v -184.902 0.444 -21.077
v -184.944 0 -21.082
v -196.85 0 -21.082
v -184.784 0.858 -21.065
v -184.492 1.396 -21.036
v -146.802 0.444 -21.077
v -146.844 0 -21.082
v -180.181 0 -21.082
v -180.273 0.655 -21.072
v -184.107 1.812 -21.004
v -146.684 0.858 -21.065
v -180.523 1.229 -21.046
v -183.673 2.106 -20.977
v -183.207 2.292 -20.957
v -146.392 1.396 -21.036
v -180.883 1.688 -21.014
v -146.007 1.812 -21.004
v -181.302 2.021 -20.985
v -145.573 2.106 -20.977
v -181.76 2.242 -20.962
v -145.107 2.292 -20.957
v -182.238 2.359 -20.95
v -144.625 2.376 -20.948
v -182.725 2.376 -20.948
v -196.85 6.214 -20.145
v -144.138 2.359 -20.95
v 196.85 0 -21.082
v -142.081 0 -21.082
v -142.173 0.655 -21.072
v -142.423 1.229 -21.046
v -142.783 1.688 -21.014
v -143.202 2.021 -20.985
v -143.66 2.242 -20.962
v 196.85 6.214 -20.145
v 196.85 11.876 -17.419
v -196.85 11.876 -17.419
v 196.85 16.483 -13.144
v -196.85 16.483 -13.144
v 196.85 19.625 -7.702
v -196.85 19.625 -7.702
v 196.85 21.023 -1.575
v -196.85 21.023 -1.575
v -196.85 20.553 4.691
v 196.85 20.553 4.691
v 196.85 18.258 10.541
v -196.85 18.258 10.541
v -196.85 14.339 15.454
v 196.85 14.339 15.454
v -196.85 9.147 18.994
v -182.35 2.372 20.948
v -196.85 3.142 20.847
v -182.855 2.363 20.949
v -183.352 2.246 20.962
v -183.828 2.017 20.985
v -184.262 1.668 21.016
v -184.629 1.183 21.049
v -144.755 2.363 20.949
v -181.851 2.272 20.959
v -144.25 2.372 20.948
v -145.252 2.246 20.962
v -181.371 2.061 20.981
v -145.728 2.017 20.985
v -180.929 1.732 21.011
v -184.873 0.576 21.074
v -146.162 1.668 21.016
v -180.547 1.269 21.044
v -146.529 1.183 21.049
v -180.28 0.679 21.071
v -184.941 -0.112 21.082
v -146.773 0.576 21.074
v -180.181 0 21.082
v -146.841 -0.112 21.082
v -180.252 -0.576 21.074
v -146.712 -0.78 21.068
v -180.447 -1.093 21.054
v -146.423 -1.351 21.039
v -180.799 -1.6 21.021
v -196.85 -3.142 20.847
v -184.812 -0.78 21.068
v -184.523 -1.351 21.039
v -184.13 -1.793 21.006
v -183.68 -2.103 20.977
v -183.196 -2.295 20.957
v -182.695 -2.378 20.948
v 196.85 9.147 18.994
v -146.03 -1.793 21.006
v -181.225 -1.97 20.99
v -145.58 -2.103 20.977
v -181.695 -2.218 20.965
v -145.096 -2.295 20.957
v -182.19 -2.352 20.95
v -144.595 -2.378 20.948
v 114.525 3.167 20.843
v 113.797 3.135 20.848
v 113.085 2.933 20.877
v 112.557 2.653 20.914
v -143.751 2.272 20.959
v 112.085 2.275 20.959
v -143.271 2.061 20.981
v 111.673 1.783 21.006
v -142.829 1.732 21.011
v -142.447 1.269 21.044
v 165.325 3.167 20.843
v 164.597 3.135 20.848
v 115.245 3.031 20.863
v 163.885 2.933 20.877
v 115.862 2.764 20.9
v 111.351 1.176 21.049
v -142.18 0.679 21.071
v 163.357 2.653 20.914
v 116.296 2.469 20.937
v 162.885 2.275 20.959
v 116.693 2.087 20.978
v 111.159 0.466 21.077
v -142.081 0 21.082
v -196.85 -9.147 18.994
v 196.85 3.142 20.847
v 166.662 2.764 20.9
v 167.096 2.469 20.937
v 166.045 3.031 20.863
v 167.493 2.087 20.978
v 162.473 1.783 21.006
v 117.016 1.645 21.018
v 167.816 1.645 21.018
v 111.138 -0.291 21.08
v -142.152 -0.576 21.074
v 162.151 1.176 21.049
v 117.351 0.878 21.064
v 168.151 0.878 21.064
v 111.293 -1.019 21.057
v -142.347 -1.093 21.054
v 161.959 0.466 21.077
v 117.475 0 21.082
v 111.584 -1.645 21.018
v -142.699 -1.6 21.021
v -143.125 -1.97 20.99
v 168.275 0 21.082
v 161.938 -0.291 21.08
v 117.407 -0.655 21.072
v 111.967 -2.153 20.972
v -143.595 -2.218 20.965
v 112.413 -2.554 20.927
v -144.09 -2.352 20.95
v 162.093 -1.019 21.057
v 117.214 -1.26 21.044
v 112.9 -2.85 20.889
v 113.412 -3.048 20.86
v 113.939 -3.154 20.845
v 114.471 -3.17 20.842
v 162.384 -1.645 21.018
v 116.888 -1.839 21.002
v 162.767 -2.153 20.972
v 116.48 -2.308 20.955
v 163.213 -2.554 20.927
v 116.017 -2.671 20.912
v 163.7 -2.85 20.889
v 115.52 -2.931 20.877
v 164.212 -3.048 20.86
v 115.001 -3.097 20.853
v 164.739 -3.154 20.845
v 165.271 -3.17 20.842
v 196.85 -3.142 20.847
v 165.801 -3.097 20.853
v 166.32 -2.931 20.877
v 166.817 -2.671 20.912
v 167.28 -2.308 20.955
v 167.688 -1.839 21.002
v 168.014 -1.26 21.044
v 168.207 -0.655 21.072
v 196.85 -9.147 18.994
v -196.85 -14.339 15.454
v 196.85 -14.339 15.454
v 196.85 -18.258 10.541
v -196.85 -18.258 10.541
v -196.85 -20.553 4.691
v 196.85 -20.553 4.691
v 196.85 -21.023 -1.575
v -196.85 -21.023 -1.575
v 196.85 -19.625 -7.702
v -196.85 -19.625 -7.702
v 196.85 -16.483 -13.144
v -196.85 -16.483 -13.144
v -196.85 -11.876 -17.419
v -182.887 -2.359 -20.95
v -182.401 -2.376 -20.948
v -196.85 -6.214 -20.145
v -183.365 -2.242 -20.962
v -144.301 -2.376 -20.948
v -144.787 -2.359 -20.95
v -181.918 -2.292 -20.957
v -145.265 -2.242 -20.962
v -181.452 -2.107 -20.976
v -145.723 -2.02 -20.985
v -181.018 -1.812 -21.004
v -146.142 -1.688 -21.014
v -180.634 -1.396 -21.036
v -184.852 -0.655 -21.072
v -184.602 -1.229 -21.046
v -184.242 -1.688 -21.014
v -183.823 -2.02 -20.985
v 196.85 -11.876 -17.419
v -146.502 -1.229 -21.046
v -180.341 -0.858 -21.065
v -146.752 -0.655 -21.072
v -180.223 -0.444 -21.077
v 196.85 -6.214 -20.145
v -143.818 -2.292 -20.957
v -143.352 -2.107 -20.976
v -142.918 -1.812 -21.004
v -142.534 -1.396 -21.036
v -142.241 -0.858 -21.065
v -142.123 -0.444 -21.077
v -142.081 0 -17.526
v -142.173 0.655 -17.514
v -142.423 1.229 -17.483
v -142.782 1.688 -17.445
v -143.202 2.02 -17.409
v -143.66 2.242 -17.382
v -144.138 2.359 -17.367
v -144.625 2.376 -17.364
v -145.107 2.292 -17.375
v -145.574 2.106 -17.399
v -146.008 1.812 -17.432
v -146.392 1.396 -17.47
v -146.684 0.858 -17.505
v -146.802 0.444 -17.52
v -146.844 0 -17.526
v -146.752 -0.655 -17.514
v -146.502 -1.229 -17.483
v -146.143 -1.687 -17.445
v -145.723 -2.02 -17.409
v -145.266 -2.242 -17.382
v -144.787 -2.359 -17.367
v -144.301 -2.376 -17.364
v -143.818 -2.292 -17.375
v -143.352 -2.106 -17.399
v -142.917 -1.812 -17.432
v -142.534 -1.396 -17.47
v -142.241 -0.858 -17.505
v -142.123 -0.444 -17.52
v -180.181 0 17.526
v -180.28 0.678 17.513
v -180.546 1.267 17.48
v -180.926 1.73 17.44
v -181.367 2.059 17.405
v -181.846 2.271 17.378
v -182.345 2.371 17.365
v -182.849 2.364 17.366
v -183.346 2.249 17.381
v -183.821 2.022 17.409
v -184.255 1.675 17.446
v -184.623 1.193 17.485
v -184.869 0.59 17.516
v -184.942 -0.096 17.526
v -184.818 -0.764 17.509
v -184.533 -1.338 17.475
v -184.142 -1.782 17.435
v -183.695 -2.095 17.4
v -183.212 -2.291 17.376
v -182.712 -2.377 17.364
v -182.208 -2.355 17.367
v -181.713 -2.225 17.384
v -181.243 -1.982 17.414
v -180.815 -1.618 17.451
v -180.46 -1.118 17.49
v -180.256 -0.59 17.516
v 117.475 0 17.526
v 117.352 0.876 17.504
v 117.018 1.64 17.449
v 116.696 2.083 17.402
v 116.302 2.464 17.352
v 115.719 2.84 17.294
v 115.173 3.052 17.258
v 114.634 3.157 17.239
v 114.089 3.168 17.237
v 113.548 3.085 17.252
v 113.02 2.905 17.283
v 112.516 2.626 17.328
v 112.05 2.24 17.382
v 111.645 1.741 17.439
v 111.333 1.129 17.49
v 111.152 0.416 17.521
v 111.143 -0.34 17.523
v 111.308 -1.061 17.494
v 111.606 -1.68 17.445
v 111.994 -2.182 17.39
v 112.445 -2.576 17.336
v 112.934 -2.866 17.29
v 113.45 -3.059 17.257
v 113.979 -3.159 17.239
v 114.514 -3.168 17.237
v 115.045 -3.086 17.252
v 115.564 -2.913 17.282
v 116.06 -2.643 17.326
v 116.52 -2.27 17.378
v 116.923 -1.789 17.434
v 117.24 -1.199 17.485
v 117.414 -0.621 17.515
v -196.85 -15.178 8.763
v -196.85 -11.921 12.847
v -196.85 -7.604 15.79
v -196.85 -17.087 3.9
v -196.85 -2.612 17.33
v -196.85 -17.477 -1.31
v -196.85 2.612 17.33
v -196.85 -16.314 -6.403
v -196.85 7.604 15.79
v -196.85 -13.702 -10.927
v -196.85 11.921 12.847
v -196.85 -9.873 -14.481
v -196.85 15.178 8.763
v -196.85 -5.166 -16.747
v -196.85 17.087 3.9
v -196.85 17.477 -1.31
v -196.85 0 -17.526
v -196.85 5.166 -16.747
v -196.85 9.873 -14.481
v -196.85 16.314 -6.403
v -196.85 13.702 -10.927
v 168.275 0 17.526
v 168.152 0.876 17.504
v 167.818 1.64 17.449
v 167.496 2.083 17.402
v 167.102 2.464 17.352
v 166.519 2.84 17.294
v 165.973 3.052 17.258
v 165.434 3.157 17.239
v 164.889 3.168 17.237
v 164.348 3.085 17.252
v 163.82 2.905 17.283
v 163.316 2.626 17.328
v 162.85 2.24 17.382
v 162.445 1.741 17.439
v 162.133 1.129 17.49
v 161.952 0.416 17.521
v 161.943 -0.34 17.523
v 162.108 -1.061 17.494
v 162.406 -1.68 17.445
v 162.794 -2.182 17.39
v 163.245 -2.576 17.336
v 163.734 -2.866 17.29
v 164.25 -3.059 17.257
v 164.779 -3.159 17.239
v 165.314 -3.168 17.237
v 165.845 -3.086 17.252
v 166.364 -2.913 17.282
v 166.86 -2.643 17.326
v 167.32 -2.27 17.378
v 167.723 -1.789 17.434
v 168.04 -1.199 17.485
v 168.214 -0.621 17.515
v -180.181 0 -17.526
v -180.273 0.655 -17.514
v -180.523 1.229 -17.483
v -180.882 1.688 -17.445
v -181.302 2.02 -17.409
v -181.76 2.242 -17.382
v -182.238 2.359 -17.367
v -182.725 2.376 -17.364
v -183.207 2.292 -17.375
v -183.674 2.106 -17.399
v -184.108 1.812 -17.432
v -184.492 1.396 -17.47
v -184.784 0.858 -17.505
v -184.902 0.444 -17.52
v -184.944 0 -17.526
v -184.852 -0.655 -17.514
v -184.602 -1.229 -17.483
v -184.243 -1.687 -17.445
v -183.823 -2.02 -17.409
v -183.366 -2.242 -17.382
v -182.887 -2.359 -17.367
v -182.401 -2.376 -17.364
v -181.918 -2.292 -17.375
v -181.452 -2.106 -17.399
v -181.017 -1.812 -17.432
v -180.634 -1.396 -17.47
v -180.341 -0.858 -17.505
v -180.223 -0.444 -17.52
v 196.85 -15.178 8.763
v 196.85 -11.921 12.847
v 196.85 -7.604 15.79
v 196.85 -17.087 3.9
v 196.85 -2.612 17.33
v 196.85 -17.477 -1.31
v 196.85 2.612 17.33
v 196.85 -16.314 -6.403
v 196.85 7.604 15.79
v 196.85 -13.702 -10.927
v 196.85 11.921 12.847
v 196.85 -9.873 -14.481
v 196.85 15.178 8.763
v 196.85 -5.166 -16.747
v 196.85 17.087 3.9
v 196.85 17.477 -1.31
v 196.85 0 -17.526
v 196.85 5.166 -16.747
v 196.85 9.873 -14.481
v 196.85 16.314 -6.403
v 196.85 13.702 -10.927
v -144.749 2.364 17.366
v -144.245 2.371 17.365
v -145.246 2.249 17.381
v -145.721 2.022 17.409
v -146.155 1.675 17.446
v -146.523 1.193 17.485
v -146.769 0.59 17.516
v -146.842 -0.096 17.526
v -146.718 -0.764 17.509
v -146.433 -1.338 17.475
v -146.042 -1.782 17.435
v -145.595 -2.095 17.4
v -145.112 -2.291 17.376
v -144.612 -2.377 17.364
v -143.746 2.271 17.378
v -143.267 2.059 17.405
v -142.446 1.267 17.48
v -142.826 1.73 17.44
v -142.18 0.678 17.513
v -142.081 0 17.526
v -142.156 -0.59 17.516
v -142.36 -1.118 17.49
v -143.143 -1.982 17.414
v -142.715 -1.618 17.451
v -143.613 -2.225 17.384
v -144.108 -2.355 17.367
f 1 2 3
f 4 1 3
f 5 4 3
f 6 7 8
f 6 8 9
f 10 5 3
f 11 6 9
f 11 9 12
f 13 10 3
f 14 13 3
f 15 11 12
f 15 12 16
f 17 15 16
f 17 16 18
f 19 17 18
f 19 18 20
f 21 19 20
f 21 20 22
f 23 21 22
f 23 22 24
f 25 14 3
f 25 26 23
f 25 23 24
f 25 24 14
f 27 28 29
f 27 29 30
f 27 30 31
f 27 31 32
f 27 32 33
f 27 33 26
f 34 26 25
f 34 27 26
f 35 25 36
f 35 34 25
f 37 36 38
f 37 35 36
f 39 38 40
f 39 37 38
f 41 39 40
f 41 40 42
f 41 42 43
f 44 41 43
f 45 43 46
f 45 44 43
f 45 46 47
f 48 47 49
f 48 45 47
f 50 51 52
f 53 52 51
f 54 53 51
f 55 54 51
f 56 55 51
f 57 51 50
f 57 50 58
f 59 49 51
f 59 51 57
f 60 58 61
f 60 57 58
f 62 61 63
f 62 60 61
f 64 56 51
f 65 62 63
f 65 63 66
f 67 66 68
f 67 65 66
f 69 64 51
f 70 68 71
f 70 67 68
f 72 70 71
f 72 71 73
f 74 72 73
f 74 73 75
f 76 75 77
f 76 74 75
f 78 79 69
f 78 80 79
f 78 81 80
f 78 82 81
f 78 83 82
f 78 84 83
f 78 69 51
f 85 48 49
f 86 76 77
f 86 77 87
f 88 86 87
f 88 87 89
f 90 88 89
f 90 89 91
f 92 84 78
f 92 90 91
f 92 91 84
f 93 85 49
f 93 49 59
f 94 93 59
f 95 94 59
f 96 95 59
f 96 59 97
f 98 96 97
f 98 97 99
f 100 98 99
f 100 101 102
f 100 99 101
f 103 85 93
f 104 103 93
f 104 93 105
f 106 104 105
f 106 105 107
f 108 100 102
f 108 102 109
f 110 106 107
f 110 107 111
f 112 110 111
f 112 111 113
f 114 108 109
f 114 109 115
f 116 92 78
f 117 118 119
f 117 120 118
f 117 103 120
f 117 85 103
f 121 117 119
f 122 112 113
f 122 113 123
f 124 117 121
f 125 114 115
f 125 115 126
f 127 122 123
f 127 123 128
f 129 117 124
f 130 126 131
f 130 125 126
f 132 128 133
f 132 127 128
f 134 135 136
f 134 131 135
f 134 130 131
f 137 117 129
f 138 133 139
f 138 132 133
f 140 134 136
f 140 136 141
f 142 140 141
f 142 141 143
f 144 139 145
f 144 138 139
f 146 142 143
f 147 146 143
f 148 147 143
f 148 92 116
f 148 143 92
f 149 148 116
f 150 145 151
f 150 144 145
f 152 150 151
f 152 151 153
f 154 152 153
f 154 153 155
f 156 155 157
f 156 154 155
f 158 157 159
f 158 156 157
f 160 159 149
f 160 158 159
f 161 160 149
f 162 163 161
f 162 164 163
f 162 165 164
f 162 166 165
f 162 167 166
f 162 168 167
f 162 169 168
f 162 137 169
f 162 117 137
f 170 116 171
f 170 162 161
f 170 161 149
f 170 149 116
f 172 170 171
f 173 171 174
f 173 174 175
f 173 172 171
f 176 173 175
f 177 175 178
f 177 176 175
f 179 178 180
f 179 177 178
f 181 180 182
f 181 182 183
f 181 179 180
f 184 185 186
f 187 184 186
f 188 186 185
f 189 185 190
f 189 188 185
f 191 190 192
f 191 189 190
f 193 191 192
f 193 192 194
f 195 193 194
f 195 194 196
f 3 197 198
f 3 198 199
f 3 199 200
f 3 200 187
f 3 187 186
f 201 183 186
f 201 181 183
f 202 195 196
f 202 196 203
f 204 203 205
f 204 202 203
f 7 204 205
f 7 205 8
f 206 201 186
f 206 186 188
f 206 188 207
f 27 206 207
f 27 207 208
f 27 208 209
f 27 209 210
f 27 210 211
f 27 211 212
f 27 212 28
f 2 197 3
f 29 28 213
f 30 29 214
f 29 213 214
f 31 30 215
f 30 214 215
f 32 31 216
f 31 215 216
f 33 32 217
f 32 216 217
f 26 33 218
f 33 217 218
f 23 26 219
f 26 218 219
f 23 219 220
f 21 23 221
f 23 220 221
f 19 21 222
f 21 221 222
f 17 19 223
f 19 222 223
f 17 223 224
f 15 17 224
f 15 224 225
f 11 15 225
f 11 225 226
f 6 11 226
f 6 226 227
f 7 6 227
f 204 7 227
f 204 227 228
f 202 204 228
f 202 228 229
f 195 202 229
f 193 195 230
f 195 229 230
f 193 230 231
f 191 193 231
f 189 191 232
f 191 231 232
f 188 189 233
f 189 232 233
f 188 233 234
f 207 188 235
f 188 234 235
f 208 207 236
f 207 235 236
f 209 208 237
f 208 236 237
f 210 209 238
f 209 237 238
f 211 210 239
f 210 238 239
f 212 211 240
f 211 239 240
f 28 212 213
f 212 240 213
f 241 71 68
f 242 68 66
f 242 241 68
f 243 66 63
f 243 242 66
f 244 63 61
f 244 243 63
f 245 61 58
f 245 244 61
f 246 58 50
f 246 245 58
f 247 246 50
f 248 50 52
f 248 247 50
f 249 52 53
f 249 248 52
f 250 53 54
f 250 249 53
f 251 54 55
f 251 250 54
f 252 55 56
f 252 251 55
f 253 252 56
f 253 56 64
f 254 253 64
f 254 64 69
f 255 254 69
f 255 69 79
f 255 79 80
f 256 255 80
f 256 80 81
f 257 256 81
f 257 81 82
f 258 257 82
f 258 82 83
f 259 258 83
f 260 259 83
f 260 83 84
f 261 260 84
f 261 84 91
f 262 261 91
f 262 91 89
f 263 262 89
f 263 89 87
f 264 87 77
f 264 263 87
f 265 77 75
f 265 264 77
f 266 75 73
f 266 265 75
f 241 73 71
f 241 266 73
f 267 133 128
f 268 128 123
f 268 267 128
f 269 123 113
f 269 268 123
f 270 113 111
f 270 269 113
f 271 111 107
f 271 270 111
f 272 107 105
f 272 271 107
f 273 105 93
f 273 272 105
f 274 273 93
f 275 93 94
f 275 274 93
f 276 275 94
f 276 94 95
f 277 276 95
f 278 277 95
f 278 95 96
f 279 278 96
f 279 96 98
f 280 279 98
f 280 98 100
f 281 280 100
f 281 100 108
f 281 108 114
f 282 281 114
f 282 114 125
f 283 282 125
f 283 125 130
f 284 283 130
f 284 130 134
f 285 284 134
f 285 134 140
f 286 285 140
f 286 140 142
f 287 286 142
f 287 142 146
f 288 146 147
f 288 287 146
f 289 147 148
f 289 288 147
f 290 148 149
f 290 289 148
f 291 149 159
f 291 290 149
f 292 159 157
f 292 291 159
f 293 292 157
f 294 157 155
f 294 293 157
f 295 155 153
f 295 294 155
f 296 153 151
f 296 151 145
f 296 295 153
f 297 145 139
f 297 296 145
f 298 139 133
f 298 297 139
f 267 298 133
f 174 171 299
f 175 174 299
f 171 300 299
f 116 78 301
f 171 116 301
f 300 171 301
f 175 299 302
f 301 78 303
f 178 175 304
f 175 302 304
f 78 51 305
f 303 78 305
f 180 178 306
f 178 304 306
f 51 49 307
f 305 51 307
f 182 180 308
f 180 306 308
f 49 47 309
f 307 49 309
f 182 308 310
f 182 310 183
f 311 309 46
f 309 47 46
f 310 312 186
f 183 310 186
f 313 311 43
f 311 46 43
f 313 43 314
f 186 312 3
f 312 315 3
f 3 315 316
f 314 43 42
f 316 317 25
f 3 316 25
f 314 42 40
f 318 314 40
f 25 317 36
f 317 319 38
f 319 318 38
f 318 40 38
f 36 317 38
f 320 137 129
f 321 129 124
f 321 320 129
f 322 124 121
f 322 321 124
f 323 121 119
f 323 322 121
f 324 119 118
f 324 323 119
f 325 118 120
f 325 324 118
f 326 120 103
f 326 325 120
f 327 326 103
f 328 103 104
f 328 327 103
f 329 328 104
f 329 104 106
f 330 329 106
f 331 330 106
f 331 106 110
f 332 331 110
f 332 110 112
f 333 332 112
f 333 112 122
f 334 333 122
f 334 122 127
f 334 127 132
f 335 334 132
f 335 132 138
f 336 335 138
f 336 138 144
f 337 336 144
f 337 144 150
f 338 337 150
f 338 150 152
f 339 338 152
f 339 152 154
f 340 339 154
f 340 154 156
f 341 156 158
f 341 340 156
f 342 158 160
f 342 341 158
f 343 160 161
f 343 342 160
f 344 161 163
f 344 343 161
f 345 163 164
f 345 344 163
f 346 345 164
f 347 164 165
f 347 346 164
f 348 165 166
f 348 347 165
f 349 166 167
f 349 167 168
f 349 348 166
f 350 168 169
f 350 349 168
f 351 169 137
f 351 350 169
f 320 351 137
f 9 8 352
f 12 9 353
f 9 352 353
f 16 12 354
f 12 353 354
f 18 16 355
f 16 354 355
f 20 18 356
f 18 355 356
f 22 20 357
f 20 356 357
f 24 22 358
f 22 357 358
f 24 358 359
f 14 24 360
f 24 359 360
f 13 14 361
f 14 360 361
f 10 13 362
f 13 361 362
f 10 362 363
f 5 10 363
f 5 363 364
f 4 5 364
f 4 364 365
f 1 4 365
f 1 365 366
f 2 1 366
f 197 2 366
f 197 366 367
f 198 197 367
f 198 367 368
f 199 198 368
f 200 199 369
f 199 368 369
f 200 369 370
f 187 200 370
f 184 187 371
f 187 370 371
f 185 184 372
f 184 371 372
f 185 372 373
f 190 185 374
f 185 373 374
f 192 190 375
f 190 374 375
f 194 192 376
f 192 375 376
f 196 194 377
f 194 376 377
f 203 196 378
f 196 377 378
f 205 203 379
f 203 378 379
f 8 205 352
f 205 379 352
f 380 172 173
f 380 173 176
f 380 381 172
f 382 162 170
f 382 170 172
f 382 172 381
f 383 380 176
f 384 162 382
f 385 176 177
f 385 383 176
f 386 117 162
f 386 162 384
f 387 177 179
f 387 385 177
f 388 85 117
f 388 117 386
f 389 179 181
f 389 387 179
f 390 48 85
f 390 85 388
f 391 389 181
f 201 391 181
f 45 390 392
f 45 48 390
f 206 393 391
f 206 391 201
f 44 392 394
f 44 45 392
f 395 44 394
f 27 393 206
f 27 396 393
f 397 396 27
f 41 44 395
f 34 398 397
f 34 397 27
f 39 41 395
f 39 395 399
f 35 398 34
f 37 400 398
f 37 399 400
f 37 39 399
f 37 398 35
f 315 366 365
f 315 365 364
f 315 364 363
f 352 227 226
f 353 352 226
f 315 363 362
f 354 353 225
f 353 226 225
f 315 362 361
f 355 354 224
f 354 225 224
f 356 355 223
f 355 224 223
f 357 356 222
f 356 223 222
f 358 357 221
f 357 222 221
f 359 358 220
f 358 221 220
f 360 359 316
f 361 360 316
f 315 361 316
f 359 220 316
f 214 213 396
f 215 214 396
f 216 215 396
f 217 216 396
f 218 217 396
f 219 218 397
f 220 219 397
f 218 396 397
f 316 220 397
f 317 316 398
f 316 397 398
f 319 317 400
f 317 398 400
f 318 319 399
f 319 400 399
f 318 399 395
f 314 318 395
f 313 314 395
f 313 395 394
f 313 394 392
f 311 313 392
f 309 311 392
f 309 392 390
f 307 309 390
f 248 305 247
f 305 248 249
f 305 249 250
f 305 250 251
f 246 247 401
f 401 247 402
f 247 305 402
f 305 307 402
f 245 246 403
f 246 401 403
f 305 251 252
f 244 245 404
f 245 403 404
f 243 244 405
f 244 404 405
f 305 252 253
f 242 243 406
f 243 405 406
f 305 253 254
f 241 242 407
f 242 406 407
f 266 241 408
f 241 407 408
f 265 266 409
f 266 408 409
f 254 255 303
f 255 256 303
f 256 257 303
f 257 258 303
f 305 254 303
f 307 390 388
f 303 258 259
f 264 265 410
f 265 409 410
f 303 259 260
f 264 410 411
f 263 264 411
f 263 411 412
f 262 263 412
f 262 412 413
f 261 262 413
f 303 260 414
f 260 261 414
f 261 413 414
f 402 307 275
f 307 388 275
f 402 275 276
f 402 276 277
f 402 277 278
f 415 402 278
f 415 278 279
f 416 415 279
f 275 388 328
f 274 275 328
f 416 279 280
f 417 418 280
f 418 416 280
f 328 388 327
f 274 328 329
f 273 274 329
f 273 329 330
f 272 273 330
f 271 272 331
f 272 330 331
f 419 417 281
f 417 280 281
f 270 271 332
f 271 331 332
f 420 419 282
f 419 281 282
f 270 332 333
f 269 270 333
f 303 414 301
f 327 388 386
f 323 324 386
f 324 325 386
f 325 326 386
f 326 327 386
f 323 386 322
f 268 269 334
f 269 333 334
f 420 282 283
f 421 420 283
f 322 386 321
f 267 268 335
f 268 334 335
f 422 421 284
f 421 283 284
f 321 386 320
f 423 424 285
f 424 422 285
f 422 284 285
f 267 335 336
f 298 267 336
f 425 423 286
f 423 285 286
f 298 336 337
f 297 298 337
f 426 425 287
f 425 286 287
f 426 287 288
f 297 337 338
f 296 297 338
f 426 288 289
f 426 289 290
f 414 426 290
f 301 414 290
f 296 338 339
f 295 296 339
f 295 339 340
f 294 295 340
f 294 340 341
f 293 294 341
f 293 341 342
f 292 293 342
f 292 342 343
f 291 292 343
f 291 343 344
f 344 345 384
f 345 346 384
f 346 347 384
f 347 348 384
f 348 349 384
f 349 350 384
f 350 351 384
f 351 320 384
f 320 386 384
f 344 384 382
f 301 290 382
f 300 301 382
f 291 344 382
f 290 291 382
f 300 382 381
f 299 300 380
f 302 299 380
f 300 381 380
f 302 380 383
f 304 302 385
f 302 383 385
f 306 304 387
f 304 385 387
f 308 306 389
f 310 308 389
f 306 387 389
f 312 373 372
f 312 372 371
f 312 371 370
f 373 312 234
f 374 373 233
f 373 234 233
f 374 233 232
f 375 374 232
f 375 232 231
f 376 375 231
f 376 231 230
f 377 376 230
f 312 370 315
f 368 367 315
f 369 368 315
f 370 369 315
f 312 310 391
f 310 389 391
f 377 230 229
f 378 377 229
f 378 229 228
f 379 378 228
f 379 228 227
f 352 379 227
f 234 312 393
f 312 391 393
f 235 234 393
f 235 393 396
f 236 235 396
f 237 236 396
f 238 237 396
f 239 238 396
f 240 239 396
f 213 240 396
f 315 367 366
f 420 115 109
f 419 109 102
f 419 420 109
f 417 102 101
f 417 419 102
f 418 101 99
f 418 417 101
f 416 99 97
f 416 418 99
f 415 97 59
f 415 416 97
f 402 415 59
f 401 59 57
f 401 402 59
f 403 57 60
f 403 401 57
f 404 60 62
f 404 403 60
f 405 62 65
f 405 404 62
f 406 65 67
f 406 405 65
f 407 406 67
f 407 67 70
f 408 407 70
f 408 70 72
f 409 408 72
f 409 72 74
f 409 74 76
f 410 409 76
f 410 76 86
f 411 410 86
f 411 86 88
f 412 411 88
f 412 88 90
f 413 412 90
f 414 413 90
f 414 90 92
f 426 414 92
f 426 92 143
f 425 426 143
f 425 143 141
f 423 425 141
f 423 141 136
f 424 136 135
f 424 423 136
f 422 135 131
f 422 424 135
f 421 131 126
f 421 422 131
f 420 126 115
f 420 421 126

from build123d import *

# Parameters (mm, degrees)
SKETCH1_R                = 21.082
SKETCH1_R_2              = 17.526
BOSS_EXTRUDE1_DEPTH      = 196.85
BOSS_EXTRUDE1_DEPTH_BACK = 196.85
SKETCH2_R                = 2.38125
CUT_EXTRUDE1_DEPTH       = 22.082
CUT_EXTRUDE1_DEPTH_BACK  = 22.082
SKETCH3_R                = 3.175
CUT_EXTRUDE2_DEPTH       = 22.0820001


with BuildPart() as part:
    # Sketch1 → Boss-Extrude1 (new body, two sides)
    with BuildSketch(Plane(origin=(0, 0, 0), x_dir=(0, 0, -1), z_dir=(1, 0, 0))) as boss_extrude1_sk:
        Circle(SKETCH1_R)
        Circle(SKETCH1_R_2, mode=Mode.SUBTRACT)
    extrude(amount=BOSS_EXTRUDE1_DEPTH)
    extrude(boss_extrude1_sk.sketch, amount=-BOSS_EXTRUDE1_DEPTH_BACK)

    # Sketch2 → Cut-Extrude1 (cut, two sides)
    with BuildSketch(Plane.XY) as cut_extrude1_sk:
        with Locations((-144.4625, 0)):
            Circle(SKETCH2_R)
        with Locations((-182.5625, 0)):
            Circle(SKETCH2_R)
    extrude(amount=CUT_EXTRUDE1_DEPTH, mode=Mode.SUBTRACT)
    extrude(cut_extrude1_sk.sketch, amount=-CUT_EXTRUDE1_DEPTH_BACK, mode=Mode.SUBTRACT)

    # Sketch3 → Cut-Extrude2 (cut, through all)
    with BuildSketch(Plane.XY):
        with Locations((165.1, 0)):
            Circle(SKETCH3_R)
        with Locations((114.3, 0)):
            Circle(SKETCH3_R)
    extrude(amount=CUT_EXTRUDE2_DEPTH, mode=Mode.SUBTRACT)


solid = part.part
